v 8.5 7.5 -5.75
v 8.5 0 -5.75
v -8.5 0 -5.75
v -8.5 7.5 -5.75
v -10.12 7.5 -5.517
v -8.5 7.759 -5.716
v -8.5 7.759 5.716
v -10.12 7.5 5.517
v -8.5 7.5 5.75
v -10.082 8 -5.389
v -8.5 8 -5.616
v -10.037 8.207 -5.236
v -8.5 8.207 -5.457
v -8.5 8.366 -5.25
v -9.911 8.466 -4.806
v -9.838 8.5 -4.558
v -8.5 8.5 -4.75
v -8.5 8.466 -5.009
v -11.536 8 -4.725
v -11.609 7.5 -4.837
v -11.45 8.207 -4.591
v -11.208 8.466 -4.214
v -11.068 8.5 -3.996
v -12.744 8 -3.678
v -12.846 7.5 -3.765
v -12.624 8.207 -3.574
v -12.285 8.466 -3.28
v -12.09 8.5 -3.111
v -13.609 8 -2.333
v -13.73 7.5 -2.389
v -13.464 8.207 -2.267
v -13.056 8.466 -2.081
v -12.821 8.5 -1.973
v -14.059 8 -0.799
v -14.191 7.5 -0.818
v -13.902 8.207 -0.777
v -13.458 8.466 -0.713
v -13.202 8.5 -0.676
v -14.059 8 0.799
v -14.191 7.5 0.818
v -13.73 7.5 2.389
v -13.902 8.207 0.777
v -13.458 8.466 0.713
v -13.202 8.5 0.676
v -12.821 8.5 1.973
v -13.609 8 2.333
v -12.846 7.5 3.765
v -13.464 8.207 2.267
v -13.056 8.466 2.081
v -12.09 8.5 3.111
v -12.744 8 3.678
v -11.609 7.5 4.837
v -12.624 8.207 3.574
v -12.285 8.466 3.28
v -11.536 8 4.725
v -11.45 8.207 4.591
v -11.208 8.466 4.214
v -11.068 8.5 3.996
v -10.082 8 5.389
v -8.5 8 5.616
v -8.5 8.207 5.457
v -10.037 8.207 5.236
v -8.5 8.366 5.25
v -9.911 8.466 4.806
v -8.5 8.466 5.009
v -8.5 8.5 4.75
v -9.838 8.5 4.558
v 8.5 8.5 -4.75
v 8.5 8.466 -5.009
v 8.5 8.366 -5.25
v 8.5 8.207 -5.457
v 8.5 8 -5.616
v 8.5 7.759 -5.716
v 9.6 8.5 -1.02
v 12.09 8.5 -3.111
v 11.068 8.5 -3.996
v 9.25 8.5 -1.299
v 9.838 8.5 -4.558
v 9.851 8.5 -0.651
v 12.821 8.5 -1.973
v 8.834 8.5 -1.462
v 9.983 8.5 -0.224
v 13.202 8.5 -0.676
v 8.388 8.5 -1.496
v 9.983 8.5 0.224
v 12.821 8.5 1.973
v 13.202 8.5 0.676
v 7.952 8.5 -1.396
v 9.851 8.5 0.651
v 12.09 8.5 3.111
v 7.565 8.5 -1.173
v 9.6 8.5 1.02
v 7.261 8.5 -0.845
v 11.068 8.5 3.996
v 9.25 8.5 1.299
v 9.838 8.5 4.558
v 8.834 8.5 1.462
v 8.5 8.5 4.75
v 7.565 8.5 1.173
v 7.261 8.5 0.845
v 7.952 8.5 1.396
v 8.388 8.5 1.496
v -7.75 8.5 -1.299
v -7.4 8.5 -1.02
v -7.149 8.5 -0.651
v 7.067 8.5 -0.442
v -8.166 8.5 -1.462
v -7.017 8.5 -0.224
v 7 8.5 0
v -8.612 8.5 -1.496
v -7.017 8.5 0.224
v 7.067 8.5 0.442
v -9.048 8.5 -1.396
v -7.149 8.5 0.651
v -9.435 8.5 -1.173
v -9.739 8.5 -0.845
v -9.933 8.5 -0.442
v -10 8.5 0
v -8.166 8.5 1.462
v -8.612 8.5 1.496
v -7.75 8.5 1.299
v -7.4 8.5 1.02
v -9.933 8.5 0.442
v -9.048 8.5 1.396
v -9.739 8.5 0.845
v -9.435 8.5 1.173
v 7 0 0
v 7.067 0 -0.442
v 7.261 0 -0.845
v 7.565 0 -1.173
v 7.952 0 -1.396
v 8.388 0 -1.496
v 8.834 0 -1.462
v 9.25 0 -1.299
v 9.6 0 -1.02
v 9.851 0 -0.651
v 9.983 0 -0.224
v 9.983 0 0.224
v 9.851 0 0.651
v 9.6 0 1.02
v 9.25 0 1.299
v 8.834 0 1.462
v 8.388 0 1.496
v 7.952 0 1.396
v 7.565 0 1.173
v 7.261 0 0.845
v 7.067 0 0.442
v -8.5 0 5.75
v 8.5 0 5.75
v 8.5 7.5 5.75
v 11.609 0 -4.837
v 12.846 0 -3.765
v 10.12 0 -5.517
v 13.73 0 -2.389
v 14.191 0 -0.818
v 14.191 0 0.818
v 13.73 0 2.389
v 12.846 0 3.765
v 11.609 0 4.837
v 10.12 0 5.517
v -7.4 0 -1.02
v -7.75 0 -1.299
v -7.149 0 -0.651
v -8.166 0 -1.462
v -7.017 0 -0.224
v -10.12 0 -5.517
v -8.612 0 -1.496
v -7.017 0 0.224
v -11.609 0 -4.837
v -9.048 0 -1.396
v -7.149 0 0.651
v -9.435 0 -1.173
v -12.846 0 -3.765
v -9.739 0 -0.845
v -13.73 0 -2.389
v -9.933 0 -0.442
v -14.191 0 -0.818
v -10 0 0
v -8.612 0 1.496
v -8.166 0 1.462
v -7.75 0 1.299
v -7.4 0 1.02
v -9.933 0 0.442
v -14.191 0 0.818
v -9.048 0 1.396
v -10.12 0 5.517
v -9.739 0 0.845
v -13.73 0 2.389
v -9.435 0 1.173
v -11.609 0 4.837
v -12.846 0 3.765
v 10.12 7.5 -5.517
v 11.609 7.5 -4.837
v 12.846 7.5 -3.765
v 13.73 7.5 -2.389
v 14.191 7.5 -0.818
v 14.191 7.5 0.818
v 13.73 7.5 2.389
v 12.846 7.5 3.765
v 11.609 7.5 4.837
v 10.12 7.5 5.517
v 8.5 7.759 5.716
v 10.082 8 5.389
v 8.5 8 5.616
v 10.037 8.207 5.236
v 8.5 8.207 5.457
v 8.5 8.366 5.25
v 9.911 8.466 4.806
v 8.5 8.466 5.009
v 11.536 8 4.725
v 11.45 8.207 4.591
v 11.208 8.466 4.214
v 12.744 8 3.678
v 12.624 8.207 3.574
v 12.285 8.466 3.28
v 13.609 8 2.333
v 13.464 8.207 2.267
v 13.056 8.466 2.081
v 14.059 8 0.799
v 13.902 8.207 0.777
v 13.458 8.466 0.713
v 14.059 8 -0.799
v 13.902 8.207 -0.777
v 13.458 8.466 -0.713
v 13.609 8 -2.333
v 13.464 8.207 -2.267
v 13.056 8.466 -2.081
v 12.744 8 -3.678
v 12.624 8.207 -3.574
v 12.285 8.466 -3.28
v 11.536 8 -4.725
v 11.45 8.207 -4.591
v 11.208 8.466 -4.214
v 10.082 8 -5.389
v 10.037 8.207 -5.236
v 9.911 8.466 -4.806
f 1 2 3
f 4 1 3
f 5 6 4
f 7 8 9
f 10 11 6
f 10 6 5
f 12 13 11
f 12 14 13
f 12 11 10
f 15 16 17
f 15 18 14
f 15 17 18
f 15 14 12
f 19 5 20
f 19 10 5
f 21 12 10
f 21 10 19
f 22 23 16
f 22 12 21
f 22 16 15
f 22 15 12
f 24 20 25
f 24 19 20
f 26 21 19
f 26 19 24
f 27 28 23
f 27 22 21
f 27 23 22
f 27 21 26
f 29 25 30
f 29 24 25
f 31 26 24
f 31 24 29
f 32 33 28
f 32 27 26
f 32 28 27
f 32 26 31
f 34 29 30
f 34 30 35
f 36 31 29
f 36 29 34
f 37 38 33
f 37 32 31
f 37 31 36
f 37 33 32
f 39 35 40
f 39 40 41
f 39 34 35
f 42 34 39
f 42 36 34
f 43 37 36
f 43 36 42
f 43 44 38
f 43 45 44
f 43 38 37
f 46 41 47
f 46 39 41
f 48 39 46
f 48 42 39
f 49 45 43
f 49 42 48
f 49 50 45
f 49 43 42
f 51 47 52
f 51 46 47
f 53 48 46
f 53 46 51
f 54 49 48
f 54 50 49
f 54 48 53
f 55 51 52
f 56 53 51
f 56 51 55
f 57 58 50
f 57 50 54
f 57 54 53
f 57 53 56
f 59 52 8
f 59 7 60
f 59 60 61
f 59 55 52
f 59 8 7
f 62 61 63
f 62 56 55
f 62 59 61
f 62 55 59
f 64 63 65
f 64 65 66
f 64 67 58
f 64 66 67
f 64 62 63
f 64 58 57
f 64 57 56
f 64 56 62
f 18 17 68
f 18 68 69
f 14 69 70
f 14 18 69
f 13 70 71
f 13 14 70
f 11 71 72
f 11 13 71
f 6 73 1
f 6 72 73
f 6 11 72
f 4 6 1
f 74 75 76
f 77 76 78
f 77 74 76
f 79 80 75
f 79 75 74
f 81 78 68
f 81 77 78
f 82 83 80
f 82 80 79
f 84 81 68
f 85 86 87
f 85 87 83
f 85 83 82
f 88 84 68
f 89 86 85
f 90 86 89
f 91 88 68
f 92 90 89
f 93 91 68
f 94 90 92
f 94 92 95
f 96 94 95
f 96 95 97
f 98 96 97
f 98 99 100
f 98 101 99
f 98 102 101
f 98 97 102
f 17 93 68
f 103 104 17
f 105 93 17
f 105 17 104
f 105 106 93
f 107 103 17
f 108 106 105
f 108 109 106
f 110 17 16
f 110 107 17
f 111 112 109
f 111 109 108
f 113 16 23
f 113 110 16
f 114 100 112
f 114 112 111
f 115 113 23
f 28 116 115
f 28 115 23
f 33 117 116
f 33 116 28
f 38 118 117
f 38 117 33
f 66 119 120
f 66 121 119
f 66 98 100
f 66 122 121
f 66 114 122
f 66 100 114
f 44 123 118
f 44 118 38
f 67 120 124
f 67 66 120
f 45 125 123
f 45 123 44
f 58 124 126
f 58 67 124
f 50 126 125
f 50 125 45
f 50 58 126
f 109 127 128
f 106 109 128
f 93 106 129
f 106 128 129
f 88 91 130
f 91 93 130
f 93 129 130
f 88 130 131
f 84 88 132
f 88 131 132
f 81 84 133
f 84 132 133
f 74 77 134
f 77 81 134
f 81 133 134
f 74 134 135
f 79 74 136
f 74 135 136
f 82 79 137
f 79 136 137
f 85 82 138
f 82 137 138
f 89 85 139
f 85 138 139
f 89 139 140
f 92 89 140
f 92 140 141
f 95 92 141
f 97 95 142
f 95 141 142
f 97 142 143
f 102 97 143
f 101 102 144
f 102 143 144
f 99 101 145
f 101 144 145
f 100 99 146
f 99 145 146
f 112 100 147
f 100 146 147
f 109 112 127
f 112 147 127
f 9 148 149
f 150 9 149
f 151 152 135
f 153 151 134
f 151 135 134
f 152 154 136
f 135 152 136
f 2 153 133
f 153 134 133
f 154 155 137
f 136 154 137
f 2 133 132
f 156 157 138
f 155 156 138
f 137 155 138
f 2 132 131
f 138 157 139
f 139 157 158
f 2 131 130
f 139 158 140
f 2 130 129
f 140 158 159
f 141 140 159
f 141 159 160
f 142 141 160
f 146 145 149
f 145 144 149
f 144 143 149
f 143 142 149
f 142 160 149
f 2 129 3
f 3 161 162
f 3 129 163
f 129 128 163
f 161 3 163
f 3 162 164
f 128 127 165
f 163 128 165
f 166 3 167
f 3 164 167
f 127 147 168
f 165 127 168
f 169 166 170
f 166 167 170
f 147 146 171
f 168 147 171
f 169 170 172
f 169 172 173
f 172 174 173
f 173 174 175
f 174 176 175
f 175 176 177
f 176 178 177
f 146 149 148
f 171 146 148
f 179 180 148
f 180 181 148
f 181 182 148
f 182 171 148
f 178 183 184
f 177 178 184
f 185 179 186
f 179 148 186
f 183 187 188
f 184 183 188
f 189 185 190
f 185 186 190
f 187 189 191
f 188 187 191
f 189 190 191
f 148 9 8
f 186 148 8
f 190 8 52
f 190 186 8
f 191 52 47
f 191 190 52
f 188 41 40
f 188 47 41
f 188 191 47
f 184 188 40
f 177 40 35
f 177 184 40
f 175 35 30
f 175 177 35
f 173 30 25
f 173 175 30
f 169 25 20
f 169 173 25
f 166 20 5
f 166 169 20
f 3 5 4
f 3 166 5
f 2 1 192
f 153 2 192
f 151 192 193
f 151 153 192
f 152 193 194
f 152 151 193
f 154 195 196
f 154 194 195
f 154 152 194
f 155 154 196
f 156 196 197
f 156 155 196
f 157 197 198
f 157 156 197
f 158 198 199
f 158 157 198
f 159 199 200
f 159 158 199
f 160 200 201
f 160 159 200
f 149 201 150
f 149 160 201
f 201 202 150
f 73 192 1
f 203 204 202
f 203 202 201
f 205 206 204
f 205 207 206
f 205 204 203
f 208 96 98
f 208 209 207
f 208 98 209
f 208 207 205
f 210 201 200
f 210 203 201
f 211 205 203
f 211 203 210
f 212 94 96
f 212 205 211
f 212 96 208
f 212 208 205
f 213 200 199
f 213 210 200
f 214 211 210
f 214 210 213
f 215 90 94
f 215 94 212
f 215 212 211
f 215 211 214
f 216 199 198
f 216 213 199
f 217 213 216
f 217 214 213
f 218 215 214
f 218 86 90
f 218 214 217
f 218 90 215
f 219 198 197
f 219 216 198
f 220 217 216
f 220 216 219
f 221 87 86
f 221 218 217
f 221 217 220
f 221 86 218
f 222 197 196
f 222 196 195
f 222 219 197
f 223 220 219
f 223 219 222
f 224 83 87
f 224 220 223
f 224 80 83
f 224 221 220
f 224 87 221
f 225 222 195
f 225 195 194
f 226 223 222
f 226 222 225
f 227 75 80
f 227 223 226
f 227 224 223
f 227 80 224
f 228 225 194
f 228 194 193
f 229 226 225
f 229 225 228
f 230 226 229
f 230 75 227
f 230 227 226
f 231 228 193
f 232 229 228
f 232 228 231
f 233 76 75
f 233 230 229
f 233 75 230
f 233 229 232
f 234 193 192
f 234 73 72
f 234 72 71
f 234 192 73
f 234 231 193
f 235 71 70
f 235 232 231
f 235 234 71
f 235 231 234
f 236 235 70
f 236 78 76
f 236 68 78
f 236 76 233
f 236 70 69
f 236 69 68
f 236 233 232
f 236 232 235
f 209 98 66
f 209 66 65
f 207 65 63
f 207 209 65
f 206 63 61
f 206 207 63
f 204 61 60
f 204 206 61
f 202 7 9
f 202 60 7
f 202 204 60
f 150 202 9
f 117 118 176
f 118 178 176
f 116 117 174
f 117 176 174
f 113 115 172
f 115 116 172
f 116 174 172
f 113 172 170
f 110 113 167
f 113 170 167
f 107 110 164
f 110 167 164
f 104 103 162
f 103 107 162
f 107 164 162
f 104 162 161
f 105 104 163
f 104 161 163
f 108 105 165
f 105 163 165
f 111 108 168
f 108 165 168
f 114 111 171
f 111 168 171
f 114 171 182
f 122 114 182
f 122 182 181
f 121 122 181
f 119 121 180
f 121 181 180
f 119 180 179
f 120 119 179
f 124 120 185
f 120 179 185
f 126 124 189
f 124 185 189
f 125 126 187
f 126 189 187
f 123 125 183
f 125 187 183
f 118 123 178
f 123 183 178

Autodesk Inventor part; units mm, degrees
ref_plane "YZ Plane" through (0, 0, 0) normal (1, 0, 0) x (0, 1, 0)
ref_plane "XZ Plane" through (0, 0, 0) normal (0, 1, 0) x (-1, 0, 0)
ref_plane "XY Plane" through (0, 0, 0) normal (0, 0, 1) x (1, 0, 0)
sketch "Sketch1" plane through (0, 0, 0) normal (0, 1, 0) x (-1, 0, 0)
  line L0 (8.5, 0) -> (-8.5, 0) construction
  line L1 (8.5, 5.75) -> (-8.5, 5.75)
  line L2 (-8.5, -5.75) -> (8.5, -5.75)
  arc A0 (8.5, -5.75) -> (8.5, 5.75) centre (8.5, 0) ccw
  arc A1 (-8.5, 5.75) -> (-8.5, -5.75) centre (-8.5, 0) ccw
  circle A2 centre (-8.5, 0) radius 1.5
  circle A3 centre (8.5, 0) radius 1.5
  point P0 (0, 0)
  dimension "d0" = 11.5
  dimension "d1" = 17
  dimension "d2" = 3
  dimension "d3" = 3
extrude "Extrusion1" add sketch "Sketch1" along normal blind 8.5
thread "Thread1" size "M3x0.5" class "6H" standard "ANSI Metric M Profile" length 11.5
thread "Thread2" size "M3x0.5" class "6H" standard "ANSI Metric M Profile" length 11.5
fillet "Fillet1" radius 1 4 edges at (0, 8.5, 5.75) (14.25, 8.5, 0) (0, 8.5, -5.75) (-14.25, 8.5, 0)
properties part number "SolderSupportDoubleNut" material "Brass"
